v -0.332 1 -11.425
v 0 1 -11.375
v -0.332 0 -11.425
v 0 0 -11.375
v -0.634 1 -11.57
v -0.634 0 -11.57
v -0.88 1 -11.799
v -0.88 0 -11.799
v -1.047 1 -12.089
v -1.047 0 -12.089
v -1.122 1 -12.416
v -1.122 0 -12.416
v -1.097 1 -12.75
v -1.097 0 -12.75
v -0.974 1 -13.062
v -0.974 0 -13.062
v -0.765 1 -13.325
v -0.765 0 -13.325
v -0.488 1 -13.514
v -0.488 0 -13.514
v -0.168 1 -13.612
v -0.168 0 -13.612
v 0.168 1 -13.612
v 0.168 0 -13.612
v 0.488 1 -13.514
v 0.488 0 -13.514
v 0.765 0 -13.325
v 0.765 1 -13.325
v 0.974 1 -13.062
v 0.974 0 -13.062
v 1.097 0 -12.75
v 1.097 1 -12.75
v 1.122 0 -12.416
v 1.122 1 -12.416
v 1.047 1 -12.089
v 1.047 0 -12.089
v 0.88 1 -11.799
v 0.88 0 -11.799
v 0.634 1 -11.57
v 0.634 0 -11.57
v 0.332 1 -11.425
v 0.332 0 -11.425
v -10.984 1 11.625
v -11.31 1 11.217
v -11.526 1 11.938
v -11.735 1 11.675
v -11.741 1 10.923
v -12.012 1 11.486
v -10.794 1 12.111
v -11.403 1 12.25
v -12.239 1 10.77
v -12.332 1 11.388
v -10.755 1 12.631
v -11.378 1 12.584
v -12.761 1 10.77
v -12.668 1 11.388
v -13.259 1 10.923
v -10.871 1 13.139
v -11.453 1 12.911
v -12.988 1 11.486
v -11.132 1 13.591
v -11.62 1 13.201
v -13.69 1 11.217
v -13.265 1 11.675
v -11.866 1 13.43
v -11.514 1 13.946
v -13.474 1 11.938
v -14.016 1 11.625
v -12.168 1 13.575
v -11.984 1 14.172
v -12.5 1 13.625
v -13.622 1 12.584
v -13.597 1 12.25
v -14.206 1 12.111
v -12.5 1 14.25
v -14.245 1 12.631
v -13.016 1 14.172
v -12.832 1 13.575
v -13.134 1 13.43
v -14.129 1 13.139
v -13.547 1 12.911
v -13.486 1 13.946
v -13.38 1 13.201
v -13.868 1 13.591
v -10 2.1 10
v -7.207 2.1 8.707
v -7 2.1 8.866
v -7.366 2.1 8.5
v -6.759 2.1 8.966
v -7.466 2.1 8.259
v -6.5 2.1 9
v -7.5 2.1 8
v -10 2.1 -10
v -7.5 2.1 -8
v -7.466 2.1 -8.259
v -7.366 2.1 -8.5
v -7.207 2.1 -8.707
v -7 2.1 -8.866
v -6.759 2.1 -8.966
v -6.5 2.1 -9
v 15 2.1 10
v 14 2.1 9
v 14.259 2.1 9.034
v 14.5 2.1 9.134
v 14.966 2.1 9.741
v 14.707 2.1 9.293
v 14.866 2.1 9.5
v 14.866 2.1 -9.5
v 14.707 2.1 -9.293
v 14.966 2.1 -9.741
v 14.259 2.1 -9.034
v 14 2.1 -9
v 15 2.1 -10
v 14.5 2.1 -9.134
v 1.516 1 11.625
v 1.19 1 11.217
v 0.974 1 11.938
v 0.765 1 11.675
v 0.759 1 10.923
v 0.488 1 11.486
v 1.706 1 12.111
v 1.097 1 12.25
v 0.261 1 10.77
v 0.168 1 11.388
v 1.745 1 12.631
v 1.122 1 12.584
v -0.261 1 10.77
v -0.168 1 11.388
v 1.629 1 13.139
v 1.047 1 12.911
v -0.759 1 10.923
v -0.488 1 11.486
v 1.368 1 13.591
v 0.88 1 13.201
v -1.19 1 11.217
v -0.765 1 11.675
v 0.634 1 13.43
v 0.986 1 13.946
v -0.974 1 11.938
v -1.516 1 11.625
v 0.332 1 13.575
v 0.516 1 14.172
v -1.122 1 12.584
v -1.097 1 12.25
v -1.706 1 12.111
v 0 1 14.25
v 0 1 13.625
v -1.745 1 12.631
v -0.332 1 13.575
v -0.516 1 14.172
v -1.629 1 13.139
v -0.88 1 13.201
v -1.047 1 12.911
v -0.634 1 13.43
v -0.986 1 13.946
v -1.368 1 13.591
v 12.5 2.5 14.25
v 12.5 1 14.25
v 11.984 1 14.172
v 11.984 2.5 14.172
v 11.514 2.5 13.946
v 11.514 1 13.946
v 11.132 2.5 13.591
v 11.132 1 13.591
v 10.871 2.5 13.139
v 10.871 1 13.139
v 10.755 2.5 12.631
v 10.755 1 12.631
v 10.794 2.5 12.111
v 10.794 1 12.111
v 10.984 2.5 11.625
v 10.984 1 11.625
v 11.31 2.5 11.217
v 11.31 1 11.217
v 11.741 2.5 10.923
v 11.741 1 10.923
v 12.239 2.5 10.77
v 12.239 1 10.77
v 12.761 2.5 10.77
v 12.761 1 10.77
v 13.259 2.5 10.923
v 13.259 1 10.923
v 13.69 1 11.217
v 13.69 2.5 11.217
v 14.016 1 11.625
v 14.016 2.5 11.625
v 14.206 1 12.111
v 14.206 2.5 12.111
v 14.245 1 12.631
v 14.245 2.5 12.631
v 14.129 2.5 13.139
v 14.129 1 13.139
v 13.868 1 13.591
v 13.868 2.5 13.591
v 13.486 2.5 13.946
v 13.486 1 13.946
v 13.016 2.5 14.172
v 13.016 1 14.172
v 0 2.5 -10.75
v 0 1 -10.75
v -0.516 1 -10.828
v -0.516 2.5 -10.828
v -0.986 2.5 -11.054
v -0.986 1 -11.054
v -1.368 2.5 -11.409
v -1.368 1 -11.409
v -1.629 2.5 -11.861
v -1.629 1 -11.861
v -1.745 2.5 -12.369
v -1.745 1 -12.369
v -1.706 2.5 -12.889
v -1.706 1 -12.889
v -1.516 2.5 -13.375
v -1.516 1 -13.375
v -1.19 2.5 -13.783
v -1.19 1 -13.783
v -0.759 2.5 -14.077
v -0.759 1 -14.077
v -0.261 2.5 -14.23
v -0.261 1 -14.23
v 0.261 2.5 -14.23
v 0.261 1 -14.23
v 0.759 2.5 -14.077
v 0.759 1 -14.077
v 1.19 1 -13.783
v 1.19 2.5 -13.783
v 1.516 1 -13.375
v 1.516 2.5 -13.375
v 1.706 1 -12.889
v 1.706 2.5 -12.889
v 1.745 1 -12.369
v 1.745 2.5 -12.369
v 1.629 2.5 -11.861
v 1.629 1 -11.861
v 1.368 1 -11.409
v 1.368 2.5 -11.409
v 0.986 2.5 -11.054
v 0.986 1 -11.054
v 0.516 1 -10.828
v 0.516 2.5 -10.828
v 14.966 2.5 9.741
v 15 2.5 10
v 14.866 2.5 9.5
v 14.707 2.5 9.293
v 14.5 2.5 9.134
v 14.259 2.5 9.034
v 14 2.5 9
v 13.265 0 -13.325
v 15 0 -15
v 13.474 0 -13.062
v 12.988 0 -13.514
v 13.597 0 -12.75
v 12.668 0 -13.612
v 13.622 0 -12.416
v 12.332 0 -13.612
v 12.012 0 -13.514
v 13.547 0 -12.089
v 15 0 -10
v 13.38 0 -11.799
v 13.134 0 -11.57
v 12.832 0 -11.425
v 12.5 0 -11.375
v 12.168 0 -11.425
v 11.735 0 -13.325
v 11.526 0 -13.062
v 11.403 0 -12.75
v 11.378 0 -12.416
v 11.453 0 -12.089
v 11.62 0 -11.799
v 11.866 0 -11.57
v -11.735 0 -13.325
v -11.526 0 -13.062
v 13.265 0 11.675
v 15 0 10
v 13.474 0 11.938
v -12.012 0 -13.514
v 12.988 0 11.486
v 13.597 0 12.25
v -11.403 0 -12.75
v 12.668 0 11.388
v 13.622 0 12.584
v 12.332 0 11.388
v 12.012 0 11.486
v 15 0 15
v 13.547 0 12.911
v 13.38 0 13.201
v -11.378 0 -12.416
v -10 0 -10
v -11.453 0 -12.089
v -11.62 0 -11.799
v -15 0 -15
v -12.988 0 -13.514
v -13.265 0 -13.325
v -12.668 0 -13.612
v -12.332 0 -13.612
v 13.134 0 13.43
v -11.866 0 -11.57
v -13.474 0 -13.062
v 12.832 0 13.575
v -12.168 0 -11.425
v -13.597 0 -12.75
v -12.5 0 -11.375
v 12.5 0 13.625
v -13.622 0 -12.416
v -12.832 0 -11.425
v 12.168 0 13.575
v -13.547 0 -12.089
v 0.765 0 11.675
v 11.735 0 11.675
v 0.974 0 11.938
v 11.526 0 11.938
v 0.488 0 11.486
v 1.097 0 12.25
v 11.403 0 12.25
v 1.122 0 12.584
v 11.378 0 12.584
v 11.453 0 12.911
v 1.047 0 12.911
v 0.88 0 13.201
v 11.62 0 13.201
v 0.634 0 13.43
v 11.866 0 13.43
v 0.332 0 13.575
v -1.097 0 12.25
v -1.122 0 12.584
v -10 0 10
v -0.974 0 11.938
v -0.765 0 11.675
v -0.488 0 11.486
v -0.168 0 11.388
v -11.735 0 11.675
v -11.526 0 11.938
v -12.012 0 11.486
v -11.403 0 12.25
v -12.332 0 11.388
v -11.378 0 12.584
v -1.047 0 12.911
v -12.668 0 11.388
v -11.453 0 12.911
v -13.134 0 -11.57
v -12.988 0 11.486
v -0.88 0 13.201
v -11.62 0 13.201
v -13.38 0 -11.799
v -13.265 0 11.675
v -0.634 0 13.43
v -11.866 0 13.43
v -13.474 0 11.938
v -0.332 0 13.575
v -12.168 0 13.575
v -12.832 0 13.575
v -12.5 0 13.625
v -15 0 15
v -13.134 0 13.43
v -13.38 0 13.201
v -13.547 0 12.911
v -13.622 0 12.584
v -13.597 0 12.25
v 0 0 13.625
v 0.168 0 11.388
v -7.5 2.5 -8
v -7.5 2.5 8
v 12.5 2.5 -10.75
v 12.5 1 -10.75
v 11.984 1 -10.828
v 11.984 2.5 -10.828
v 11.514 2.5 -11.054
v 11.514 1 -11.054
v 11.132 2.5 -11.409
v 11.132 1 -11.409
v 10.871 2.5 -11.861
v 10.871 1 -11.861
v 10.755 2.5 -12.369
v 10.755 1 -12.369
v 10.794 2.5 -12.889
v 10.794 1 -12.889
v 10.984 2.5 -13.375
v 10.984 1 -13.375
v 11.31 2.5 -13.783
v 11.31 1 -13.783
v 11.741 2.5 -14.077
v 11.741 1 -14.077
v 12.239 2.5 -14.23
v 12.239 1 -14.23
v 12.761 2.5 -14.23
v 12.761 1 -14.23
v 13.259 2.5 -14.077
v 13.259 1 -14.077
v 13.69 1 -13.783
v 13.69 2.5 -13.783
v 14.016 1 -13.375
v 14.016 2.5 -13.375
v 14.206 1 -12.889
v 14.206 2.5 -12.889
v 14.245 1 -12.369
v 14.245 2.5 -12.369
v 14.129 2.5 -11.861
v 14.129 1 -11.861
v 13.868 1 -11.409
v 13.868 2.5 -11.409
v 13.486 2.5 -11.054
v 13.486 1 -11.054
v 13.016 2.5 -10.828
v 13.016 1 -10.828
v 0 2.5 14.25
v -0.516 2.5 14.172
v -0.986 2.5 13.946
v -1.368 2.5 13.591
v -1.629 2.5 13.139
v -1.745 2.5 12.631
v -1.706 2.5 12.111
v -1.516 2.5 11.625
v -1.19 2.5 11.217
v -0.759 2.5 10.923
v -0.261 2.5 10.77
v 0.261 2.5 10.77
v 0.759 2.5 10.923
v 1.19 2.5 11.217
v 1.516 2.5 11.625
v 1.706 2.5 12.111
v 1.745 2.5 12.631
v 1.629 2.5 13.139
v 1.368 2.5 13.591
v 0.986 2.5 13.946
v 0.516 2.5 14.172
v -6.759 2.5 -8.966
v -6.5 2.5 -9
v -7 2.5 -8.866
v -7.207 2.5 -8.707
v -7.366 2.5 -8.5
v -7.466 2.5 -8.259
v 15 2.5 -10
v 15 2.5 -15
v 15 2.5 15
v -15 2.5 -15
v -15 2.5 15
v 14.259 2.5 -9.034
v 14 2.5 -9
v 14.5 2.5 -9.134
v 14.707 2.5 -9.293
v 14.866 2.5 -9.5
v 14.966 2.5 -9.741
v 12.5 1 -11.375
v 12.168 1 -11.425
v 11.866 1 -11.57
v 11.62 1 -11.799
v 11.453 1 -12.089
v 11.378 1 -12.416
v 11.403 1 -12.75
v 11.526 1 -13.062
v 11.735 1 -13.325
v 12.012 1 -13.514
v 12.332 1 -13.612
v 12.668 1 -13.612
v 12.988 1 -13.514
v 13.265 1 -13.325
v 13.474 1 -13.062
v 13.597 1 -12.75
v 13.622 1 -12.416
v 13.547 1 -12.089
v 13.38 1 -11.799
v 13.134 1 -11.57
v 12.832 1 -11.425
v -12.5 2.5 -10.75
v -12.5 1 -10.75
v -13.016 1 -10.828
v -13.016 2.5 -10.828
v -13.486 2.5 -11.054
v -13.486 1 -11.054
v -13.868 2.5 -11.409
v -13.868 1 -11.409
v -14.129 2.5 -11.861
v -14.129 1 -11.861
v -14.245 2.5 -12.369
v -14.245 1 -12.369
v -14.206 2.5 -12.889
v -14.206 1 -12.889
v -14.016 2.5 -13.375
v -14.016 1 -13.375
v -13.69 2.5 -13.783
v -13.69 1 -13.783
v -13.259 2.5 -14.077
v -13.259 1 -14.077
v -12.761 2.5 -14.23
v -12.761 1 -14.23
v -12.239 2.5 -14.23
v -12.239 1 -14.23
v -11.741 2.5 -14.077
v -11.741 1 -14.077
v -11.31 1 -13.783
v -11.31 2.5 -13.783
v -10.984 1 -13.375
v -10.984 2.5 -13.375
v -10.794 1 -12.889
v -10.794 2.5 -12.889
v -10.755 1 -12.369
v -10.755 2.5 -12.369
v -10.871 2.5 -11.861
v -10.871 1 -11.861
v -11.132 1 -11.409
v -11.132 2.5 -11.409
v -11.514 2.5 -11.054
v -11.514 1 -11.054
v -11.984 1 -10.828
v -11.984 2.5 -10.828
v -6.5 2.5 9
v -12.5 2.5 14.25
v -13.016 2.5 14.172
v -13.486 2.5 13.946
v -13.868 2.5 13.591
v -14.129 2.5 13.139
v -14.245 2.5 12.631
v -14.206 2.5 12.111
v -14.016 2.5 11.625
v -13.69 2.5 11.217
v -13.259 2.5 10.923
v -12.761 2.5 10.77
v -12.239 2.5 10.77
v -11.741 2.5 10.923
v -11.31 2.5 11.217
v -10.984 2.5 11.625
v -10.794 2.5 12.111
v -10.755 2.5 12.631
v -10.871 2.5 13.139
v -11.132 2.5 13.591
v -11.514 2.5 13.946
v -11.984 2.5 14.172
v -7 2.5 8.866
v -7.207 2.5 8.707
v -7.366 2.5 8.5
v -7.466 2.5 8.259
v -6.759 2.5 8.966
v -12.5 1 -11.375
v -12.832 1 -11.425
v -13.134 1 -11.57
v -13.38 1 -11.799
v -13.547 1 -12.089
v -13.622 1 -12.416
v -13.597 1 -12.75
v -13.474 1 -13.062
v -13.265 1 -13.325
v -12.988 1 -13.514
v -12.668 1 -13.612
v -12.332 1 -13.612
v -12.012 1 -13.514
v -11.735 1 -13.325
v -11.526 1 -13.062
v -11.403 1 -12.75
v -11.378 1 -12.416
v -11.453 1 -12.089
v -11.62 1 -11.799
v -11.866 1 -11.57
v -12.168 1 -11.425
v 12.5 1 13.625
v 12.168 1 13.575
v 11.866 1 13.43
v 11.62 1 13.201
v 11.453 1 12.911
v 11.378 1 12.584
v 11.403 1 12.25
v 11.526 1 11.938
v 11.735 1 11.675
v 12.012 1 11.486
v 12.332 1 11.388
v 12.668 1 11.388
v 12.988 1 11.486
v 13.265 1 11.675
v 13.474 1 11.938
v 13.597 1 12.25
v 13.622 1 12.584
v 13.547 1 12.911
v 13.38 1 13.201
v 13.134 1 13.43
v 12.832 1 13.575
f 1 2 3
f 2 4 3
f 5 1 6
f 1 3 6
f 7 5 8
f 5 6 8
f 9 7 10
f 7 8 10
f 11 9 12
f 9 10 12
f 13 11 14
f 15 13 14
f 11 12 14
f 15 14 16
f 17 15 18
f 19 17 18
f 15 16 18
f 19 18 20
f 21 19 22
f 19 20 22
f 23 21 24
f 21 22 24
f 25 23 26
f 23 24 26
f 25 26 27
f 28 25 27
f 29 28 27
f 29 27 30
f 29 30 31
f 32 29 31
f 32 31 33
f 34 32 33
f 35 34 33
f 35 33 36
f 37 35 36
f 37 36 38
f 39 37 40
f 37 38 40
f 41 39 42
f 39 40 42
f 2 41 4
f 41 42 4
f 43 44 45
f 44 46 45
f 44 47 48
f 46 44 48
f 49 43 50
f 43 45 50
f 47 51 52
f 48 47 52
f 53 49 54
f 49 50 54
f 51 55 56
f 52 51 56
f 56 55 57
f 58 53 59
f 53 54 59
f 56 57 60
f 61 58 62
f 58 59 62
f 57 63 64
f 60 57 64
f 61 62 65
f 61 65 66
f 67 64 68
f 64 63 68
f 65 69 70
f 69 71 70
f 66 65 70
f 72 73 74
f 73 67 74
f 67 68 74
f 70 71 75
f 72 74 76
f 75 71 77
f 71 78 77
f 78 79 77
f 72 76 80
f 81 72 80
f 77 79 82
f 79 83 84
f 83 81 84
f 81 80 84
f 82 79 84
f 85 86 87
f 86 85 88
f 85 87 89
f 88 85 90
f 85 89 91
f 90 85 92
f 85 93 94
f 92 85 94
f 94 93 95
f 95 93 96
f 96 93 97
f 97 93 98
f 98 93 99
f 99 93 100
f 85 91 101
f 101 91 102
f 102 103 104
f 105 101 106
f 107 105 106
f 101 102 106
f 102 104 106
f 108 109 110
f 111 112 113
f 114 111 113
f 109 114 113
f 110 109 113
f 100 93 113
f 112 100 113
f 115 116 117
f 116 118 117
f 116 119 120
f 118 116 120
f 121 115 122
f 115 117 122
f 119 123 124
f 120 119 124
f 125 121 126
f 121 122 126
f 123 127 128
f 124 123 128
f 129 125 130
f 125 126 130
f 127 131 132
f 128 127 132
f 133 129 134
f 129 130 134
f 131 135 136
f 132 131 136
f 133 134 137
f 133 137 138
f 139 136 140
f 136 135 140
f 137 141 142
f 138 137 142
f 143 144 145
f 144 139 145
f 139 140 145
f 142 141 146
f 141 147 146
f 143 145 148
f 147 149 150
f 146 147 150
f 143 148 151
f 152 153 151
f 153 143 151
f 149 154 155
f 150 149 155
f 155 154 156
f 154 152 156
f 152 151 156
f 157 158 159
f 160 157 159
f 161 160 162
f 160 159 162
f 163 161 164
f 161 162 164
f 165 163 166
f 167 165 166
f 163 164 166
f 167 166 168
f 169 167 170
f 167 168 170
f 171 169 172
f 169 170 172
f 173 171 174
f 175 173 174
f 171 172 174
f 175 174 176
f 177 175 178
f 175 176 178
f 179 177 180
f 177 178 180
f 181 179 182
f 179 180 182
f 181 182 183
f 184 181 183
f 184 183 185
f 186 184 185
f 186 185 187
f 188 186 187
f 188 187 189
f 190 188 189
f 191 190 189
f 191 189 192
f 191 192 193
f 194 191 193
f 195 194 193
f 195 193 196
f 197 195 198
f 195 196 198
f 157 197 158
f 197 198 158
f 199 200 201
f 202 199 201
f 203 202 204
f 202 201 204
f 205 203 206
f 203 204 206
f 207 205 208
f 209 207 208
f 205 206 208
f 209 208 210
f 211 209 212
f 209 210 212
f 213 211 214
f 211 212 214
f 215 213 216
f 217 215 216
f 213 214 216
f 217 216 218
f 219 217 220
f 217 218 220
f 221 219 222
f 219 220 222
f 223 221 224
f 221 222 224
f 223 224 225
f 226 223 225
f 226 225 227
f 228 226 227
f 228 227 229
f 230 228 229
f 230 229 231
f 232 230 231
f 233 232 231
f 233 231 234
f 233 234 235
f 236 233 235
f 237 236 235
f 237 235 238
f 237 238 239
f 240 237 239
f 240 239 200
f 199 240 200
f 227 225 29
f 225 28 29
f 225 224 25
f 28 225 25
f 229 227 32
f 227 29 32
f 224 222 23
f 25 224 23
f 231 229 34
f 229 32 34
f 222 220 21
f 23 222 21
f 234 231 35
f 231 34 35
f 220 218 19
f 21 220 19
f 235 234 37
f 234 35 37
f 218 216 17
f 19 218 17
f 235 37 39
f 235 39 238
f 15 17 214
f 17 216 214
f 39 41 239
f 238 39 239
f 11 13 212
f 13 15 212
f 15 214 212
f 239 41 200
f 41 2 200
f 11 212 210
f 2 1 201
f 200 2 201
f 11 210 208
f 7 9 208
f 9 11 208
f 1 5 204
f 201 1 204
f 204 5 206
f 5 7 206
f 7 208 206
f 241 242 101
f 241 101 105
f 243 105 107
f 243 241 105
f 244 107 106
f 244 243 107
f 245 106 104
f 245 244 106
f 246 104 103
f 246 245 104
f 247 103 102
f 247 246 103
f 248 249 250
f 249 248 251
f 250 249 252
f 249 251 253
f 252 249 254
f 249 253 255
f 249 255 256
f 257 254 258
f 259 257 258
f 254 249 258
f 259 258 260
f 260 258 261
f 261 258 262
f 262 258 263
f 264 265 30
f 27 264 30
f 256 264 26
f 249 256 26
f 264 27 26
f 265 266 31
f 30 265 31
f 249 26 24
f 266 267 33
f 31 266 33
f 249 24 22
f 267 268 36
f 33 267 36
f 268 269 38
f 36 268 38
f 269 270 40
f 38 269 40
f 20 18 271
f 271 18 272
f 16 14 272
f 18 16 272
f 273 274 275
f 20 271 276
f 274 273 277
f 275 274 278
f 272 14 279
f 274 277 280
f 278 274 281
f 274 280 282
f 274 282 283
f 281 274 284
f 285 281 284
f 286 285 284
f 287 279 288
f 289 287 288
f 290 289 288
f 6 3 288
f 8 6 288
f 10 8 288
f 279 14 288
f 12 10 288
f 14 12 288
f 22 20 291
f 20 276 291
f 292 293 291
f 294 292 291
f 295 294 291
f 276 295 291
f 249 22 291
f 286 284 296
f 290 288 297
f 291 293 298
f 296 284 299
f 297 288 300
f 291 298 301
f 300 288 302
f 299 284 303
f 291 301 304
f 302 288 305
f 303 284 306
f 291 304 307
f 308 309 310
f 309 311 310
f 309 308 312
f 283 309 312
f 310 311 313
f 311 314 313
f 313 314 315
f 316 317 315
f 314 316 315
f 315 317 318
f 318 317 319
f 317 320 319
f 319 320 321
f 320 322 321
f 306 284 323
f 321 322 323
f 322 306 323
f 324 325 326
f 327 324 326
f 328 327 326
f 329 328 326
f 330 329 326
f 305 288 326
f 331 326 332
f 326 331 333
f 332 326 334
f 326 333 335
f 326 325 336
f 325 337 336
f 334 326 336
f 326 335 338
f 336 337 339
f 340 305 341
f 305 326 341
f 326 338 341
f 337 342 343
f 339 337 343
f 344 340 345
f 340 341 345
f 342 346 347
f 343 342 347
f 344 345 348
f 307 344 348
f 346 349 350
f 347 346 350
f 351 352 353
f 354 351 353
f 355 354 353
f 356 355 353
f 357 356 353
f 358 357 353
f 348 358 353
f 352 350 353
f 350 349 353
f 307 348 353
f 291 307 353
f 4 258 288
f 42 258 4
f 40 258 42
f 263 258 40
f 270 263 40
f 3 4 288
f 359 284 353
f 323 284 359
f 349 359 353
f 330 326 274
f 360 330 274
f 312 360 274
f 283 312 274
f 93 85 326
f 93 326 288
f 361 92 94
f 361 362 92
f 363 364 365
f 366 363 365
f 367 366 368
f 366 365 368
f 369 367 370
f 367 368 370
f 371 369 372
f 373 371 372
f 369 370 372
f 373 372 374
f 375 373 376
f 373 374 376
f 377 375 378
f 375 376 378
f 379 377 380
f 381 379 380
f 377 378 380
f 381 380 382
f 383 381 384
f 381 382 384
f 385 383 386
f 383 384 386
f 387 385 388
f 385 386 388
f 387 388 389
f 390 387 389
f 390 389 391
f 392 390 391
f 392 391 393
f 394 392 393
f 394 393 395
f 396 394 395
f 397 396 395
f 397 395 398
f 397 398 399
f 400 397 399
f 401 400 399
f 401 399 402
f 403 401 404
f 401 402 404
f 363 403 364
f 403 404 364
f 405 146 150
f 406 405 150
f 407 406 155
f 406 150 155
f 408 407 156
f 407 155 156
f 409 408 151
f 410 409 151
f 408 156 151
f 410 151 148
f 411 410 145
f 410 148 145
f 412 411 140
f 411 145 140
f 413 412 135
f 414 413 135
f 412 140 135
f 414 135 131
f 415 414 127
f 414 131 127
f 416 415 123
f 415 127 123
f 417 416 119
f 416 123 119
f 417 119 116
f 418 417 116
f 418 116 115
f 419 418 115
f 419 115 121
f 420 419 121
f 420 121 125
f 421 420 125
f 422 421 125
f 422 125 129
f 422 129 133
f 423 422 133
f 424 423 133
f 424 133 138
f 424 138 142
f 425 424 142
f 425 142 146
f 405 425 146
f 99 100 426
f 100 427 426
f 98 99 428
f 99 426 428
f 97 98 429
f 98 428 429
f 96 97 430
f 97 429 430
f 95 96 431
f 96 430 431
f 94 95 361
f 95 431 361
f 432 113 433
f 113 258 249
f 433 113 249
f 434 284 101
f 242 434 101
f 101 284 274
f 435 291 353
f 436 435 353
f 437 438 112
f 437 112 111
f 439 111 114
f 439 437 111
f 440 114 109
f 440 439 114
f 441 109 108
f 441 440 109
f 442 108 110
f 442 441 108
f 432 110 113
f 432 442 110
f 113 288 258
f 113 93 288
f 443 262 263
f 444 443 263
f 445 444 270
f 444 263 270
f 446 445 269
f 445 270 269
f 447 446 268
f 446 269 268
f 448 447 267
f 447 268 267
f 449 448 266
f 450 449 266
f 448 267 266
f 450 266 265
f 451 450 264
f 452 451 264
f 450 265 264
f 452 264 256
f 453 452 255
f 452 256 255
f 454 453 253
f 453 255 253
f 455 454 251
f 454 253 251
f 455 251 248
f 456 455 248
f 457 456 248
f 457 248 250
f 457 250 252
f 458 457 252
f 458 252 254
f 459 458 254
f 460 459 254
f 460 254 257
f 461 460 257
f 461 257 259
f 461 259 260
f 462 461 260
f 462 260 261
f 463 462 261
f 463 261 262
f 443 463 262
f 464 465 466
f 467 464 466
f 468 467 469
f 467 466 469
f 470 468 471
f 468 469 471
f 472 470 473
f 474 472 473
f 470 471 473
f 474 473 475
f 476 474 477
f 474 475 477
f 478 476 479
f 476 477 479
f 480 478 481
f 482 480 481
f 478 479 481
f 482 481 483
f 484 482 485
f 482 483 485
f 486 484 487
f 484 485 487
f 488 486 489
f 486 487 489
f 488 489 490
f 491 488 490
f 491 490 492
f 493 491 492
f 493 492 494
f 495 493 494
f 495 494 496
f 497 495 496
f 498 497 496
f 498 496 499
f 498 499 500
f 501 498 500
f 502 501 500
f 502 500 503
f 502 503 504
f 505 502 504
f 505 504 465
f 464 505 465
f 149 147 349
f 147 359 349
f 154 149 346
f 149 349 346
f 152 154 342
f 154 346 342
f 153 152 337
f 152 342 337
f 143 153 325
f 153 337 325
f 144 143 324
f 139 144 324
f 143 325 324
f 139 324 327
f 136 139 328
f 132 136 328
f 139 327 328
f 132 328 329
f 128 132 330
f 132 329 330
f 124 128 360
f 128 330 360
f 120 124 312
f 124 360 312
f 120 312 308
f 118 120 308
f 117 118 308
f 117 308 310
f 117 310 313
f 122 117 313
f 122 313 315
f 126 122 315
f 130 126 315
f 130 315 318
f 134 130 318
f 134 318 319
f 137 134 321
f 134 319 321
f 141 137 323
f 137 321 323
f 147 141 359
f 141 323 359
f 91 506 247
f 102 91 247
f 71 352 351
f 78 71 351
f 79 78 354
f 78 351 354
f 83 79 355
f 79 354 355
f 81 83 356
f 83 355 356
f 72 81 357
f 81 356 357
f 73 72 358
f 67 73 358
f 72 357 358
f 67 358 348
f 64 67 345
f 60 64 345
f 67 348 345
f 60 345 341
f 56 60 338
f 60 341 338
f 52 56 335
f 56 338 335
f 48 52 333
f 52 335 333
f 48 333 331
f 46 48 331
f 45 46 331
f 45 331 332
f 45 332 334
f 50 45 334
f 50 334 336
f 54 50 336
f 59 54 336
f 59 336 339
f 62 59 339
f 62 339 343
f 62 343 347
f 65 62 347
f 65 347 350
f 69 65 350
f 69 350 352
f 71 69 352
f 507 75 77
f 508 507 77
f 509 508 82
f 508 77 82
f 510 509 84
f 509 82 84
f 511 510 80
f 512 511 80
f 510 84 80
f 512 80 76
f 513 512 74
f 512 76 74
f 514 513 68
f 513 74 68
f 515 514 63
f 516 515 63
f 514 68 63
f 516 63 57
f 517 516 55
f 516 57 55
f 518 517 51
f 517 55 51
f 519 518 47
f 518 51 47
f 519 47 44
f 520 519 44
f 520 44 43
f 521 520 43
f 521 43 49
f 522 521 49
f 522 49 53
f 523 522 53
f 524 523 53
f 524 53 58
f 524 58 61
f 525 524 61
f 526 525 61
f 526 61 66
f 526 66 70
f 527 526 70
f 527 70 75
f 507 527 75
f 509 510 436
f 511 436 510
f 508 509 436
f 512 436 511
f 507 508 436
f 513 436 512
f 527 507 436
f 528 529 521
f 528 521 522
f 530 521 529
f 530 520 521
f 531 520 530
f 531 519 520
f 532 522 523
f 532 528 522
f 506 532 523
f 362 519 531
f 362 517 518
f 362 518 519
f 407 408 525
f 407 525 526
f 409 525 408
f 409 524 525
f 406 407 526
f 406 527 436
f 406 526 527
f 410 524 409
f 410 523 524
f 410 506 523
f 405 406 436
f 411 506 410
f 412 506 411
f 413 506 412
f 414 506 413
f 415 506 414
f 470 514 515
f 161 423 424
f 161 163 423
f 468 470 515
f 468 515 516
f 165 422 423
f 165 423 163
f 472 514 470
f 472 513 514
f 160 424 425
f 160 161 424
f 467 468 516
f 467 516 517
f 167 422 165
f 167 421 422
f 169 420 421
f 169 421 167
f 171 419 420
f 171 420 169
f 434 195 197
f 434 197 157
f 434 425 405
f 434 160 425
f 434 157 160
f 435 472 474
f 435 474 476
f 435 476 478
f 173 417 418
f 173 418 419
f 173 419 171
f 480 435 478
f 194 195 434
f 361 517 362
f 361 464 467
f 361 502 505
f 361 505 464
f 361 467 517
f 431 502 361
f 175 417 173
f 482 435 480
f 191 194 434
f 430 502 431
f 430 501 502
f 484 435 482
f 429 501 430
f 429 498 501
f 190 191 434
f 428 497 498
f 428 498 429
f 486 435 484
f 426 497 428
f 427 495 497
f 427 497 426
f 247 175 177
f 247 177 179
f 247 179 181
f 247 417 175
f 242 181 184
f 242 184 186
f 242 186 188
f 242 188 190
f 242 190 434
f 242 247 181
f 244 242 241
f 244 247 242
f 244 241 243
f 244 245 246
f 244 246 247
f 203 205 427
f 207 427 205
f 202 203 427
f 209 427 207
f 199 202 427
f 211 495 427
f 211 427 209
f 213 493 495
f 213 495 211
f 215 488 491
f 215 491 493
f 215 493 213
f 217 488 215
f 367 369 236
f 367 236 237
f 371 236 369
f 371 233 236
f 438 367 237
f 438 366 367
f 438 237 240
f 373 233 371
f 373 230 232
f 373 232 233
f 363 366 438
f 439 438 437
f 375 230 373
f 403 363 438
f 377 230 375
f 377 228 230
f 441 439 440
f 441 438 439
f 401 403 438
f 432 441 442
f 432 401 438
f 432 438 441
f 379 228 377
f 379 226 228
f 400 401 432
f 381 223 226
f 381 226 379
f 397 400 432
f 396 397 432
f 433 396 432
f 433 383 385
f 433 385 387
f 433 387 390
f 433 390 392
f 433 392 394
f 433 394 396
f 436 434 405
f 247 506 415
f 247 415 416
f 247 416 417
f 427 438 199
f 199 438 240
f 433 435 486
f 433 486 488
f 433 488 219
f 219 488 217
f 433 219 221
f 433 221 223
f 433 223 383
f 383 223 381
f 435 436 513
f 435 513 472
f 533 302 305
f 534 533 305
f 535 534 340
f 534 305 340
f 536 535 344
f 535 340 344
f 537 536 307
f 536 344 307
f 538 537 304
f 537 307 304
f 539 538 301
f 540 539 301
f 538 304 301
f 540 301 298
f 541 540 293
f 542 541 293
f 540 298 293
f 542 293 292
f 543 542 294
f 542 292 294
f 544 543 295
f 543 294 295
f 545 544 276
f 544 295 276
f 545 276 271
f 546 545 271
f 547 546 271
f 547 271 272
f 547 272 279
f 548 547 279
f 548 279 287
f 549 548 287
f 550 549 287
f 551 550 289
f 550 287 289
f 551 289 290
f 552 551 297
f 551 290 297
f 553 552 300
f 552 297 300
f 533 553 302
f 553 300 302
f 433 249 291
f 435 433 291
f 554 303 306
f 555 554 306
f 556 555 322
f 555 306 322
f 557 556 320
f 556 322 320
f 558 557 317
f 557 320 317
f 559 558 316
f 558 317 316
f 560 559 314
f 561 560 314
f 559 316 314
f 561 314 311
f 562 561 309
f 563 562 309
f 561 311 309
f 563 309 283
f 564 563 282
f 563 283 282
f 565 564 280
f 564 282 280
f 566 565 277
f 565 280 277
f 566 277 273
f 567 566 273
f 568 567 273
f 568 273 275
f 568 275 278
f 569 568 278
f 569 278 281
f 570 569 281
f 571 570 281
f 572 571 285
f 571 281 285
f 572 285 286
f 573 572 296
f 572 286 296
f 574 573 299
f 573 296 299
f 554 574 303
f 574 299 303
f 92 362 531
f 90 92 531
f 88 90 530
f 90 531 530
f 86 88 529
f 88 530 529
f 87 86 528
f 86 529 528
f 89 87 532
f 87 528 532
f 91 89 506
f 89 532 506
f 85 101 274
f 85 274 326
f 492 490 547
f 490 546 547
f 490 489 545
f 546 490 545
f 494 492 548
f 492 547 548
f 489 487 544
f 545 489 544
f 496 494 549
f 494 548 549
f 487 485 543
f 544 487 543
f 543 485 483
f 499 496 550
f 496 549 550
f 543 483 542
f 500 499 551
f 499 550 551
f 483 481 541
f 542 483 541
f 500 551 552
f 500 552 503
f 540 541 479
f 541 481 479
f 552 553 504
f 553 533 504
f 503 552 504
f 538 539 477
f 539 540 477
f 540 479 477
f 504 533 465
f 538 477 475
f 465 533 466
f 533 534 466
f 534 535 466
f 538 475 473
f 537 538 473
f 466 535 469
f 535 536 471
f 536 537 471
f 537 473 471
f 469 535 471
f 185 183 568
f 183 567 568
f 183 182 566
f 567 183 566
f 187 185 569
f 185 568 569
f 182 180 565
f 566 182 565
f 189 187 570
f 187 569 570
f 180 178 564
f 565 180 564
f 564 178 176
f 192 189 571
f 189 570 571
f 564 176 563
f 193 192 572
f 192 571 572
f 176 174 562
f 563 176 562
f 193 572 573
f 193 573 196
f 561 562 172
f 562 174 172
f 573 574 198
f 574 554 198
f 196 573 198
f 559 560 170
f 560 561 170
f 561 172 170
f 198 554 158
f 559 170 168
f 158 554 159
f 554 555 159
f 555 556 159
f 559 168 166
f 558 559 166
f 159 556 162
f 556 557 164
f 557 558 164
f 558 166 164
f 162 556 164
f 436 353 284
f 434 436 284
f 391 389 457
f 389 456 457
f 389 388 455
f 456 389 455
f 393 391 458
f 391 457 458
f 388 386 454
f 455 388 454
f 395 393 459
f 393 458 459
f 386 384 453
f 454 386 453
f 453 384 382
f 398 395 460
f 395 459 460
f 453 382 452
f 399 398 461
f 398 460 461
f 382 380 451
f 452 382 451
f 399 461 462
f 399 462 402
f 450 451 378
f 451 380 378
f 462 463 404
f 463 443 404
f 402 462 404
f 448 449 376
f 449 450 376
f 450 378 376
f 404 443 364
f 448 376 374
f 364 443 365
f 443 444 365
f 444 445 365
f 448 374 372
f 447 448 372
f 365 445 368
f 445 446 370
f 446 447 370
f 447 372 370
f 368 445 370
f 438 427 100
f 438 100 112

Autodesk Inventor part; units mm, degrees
ref_plane "YZ Plane" through (0, 0, 0) normal (1, 0, 0) x (0, 1, 0)
ref_plane "XZ Plane" through (0, 0, 0) normal (0, 1, 0) x (-1, 0, 0)
ref_plane "XY Plane" through (0, 0, 0) normal (0, 0, 1) x (1, 0, 0)
sketch "Sketch1" plane through (0, 0, 0) normal (0, 1, 0) x (-1, 0, 0)
  line L0 (-15, -15) -> (15, -15)
  line L1 (15, -15) -> (15, 15)
  line L2 (15, 15) -> (-15, 15)
  line L3 (-15, 15) -> (-15, -15)
  line L4 (-15, -15) -> (15, 15) construction
  line L5 (15, -15) -> (-15, 15) construction
  point P0 (0, 0)
  dimension "d0" = 30
  dimension "d1" = 30
extrude "Extrusion1" add sketch "Sketch1" along normal blind 2.5
sketch "Sketch2" plane through (0, 2.5, 0) normal (0, 1, 0) x (1, 0, 0)
  line L0 (15, -15) -> (15, 15) projected
  line L1 (15, -10) -> (-10, -10)
  line L2 (-10, -10) -> (-10, 10)
  line L3 (-10, 10) -> (15, 10)
  line L4 (15, 10) -> (15, -10)
  point P0 (0, 0)
  point P1 (15, 10)
  dimension "d4" = 20
  dimension "d5" = 10
  dimension "d6" = 25
extrude "Extrusion2" cut sketch "Sketch2" against normal through all
sketch "Sketch3" plane through (0, 2.5, 0) normal (0, 1, 0) x (1, 0, 0)
  line L0 (15, -10) -> (-10, -10) projected
  line L1 (-10, -10) -> (-10, 10) projected
  line L2 (-10, 10) -> (15, 10) projected
  line L3 (15, -10) -> (-10, -10)
  line L4 (-10, -10) -> (-10, -9)
  line L5 (-6.5, -9) -> (14, -9)
  line L6 (15, -10) -> (15, -10)
  line L7 (15, 10) -> (-10, 10)
  line L8 (-10, 10) -> (-10, 9)
  line L9 (-6.5, 9) -> (14, 9)
  line L10 (15, 10) -> (15, 10)
  line L11 (-10, -10) -> (-7.5, -10)
  line L12 (-7.5, -8) -> (-7.5, 8)
  line L13 (-7.5, 10) -> (-10, 10)
  line L14 (-10, 10) -> (-10, -10)
  arc A0 (15, -10) -> (14, -9) centre (14, -10) ccw
  arc A1 (-7.5, -8) -> (-6.5, -9) centre (-6.5, -8) ccw
  arc A2 (-6.5, 9) -> (-7.5, 8) centre (-6.5, 8) ccw
  arc A3 (14, 9) -> (15, 10) centre (14, 10) ccw
  point P0 (0, 0)
  point P1 (15, -9)
  point P2 (15, 9)
  point P3 (-7.5, -9)
  point P4 (-7.5, 9)
  dimension "d9" = 1
  dimension "d10" = 1
  dimension "d11" = 2.5
  dimension "d14" = 1
extrude "Extrusion3" add sketch "Sketch3" against normal blind 0.4
sketch "Sketch4" plane through (0, 2.5, 0) normal (0, 1, 0) x (1, 0, 0)
  point P0 (0, 0)
  point P1 (12.5, -12.5)
  point P2 (-12.5, -12.5)
  point P3 (-12.5, 12.5)
  point P4 (12.5, 12.5)
  point P5 (-12.5, 0)
  point P6 (0, -12.5)
  point P7 (0, 12.5)
  dimension "d15" = 25
  dimension "d16" = 25
  dimension "d17" = 12.5
  dimension "d18" = 12.5
hole "Hole1" at (12.5, 2.5, 12.5) at (-12.5, 2.5, 12.5) at (-12.5, 2.5, -12.5) at (12.5, 2.5, -12.5) at (0, 2.5, 12.5) at (0, 2.5, -12.5) direction (0, -1, 0) diameter 2.25 end through all counterbore diameter 3.5 counterbore depth 1.5
equation "\"d5\" = 0.5 * d4"
equation "\"d10\" = d9"
equation "\"d17\" = 0.5 * d15"
equation "\"d18\" = 0.5 * d16"
properties part number "Flex Circuit Clamp V1"
